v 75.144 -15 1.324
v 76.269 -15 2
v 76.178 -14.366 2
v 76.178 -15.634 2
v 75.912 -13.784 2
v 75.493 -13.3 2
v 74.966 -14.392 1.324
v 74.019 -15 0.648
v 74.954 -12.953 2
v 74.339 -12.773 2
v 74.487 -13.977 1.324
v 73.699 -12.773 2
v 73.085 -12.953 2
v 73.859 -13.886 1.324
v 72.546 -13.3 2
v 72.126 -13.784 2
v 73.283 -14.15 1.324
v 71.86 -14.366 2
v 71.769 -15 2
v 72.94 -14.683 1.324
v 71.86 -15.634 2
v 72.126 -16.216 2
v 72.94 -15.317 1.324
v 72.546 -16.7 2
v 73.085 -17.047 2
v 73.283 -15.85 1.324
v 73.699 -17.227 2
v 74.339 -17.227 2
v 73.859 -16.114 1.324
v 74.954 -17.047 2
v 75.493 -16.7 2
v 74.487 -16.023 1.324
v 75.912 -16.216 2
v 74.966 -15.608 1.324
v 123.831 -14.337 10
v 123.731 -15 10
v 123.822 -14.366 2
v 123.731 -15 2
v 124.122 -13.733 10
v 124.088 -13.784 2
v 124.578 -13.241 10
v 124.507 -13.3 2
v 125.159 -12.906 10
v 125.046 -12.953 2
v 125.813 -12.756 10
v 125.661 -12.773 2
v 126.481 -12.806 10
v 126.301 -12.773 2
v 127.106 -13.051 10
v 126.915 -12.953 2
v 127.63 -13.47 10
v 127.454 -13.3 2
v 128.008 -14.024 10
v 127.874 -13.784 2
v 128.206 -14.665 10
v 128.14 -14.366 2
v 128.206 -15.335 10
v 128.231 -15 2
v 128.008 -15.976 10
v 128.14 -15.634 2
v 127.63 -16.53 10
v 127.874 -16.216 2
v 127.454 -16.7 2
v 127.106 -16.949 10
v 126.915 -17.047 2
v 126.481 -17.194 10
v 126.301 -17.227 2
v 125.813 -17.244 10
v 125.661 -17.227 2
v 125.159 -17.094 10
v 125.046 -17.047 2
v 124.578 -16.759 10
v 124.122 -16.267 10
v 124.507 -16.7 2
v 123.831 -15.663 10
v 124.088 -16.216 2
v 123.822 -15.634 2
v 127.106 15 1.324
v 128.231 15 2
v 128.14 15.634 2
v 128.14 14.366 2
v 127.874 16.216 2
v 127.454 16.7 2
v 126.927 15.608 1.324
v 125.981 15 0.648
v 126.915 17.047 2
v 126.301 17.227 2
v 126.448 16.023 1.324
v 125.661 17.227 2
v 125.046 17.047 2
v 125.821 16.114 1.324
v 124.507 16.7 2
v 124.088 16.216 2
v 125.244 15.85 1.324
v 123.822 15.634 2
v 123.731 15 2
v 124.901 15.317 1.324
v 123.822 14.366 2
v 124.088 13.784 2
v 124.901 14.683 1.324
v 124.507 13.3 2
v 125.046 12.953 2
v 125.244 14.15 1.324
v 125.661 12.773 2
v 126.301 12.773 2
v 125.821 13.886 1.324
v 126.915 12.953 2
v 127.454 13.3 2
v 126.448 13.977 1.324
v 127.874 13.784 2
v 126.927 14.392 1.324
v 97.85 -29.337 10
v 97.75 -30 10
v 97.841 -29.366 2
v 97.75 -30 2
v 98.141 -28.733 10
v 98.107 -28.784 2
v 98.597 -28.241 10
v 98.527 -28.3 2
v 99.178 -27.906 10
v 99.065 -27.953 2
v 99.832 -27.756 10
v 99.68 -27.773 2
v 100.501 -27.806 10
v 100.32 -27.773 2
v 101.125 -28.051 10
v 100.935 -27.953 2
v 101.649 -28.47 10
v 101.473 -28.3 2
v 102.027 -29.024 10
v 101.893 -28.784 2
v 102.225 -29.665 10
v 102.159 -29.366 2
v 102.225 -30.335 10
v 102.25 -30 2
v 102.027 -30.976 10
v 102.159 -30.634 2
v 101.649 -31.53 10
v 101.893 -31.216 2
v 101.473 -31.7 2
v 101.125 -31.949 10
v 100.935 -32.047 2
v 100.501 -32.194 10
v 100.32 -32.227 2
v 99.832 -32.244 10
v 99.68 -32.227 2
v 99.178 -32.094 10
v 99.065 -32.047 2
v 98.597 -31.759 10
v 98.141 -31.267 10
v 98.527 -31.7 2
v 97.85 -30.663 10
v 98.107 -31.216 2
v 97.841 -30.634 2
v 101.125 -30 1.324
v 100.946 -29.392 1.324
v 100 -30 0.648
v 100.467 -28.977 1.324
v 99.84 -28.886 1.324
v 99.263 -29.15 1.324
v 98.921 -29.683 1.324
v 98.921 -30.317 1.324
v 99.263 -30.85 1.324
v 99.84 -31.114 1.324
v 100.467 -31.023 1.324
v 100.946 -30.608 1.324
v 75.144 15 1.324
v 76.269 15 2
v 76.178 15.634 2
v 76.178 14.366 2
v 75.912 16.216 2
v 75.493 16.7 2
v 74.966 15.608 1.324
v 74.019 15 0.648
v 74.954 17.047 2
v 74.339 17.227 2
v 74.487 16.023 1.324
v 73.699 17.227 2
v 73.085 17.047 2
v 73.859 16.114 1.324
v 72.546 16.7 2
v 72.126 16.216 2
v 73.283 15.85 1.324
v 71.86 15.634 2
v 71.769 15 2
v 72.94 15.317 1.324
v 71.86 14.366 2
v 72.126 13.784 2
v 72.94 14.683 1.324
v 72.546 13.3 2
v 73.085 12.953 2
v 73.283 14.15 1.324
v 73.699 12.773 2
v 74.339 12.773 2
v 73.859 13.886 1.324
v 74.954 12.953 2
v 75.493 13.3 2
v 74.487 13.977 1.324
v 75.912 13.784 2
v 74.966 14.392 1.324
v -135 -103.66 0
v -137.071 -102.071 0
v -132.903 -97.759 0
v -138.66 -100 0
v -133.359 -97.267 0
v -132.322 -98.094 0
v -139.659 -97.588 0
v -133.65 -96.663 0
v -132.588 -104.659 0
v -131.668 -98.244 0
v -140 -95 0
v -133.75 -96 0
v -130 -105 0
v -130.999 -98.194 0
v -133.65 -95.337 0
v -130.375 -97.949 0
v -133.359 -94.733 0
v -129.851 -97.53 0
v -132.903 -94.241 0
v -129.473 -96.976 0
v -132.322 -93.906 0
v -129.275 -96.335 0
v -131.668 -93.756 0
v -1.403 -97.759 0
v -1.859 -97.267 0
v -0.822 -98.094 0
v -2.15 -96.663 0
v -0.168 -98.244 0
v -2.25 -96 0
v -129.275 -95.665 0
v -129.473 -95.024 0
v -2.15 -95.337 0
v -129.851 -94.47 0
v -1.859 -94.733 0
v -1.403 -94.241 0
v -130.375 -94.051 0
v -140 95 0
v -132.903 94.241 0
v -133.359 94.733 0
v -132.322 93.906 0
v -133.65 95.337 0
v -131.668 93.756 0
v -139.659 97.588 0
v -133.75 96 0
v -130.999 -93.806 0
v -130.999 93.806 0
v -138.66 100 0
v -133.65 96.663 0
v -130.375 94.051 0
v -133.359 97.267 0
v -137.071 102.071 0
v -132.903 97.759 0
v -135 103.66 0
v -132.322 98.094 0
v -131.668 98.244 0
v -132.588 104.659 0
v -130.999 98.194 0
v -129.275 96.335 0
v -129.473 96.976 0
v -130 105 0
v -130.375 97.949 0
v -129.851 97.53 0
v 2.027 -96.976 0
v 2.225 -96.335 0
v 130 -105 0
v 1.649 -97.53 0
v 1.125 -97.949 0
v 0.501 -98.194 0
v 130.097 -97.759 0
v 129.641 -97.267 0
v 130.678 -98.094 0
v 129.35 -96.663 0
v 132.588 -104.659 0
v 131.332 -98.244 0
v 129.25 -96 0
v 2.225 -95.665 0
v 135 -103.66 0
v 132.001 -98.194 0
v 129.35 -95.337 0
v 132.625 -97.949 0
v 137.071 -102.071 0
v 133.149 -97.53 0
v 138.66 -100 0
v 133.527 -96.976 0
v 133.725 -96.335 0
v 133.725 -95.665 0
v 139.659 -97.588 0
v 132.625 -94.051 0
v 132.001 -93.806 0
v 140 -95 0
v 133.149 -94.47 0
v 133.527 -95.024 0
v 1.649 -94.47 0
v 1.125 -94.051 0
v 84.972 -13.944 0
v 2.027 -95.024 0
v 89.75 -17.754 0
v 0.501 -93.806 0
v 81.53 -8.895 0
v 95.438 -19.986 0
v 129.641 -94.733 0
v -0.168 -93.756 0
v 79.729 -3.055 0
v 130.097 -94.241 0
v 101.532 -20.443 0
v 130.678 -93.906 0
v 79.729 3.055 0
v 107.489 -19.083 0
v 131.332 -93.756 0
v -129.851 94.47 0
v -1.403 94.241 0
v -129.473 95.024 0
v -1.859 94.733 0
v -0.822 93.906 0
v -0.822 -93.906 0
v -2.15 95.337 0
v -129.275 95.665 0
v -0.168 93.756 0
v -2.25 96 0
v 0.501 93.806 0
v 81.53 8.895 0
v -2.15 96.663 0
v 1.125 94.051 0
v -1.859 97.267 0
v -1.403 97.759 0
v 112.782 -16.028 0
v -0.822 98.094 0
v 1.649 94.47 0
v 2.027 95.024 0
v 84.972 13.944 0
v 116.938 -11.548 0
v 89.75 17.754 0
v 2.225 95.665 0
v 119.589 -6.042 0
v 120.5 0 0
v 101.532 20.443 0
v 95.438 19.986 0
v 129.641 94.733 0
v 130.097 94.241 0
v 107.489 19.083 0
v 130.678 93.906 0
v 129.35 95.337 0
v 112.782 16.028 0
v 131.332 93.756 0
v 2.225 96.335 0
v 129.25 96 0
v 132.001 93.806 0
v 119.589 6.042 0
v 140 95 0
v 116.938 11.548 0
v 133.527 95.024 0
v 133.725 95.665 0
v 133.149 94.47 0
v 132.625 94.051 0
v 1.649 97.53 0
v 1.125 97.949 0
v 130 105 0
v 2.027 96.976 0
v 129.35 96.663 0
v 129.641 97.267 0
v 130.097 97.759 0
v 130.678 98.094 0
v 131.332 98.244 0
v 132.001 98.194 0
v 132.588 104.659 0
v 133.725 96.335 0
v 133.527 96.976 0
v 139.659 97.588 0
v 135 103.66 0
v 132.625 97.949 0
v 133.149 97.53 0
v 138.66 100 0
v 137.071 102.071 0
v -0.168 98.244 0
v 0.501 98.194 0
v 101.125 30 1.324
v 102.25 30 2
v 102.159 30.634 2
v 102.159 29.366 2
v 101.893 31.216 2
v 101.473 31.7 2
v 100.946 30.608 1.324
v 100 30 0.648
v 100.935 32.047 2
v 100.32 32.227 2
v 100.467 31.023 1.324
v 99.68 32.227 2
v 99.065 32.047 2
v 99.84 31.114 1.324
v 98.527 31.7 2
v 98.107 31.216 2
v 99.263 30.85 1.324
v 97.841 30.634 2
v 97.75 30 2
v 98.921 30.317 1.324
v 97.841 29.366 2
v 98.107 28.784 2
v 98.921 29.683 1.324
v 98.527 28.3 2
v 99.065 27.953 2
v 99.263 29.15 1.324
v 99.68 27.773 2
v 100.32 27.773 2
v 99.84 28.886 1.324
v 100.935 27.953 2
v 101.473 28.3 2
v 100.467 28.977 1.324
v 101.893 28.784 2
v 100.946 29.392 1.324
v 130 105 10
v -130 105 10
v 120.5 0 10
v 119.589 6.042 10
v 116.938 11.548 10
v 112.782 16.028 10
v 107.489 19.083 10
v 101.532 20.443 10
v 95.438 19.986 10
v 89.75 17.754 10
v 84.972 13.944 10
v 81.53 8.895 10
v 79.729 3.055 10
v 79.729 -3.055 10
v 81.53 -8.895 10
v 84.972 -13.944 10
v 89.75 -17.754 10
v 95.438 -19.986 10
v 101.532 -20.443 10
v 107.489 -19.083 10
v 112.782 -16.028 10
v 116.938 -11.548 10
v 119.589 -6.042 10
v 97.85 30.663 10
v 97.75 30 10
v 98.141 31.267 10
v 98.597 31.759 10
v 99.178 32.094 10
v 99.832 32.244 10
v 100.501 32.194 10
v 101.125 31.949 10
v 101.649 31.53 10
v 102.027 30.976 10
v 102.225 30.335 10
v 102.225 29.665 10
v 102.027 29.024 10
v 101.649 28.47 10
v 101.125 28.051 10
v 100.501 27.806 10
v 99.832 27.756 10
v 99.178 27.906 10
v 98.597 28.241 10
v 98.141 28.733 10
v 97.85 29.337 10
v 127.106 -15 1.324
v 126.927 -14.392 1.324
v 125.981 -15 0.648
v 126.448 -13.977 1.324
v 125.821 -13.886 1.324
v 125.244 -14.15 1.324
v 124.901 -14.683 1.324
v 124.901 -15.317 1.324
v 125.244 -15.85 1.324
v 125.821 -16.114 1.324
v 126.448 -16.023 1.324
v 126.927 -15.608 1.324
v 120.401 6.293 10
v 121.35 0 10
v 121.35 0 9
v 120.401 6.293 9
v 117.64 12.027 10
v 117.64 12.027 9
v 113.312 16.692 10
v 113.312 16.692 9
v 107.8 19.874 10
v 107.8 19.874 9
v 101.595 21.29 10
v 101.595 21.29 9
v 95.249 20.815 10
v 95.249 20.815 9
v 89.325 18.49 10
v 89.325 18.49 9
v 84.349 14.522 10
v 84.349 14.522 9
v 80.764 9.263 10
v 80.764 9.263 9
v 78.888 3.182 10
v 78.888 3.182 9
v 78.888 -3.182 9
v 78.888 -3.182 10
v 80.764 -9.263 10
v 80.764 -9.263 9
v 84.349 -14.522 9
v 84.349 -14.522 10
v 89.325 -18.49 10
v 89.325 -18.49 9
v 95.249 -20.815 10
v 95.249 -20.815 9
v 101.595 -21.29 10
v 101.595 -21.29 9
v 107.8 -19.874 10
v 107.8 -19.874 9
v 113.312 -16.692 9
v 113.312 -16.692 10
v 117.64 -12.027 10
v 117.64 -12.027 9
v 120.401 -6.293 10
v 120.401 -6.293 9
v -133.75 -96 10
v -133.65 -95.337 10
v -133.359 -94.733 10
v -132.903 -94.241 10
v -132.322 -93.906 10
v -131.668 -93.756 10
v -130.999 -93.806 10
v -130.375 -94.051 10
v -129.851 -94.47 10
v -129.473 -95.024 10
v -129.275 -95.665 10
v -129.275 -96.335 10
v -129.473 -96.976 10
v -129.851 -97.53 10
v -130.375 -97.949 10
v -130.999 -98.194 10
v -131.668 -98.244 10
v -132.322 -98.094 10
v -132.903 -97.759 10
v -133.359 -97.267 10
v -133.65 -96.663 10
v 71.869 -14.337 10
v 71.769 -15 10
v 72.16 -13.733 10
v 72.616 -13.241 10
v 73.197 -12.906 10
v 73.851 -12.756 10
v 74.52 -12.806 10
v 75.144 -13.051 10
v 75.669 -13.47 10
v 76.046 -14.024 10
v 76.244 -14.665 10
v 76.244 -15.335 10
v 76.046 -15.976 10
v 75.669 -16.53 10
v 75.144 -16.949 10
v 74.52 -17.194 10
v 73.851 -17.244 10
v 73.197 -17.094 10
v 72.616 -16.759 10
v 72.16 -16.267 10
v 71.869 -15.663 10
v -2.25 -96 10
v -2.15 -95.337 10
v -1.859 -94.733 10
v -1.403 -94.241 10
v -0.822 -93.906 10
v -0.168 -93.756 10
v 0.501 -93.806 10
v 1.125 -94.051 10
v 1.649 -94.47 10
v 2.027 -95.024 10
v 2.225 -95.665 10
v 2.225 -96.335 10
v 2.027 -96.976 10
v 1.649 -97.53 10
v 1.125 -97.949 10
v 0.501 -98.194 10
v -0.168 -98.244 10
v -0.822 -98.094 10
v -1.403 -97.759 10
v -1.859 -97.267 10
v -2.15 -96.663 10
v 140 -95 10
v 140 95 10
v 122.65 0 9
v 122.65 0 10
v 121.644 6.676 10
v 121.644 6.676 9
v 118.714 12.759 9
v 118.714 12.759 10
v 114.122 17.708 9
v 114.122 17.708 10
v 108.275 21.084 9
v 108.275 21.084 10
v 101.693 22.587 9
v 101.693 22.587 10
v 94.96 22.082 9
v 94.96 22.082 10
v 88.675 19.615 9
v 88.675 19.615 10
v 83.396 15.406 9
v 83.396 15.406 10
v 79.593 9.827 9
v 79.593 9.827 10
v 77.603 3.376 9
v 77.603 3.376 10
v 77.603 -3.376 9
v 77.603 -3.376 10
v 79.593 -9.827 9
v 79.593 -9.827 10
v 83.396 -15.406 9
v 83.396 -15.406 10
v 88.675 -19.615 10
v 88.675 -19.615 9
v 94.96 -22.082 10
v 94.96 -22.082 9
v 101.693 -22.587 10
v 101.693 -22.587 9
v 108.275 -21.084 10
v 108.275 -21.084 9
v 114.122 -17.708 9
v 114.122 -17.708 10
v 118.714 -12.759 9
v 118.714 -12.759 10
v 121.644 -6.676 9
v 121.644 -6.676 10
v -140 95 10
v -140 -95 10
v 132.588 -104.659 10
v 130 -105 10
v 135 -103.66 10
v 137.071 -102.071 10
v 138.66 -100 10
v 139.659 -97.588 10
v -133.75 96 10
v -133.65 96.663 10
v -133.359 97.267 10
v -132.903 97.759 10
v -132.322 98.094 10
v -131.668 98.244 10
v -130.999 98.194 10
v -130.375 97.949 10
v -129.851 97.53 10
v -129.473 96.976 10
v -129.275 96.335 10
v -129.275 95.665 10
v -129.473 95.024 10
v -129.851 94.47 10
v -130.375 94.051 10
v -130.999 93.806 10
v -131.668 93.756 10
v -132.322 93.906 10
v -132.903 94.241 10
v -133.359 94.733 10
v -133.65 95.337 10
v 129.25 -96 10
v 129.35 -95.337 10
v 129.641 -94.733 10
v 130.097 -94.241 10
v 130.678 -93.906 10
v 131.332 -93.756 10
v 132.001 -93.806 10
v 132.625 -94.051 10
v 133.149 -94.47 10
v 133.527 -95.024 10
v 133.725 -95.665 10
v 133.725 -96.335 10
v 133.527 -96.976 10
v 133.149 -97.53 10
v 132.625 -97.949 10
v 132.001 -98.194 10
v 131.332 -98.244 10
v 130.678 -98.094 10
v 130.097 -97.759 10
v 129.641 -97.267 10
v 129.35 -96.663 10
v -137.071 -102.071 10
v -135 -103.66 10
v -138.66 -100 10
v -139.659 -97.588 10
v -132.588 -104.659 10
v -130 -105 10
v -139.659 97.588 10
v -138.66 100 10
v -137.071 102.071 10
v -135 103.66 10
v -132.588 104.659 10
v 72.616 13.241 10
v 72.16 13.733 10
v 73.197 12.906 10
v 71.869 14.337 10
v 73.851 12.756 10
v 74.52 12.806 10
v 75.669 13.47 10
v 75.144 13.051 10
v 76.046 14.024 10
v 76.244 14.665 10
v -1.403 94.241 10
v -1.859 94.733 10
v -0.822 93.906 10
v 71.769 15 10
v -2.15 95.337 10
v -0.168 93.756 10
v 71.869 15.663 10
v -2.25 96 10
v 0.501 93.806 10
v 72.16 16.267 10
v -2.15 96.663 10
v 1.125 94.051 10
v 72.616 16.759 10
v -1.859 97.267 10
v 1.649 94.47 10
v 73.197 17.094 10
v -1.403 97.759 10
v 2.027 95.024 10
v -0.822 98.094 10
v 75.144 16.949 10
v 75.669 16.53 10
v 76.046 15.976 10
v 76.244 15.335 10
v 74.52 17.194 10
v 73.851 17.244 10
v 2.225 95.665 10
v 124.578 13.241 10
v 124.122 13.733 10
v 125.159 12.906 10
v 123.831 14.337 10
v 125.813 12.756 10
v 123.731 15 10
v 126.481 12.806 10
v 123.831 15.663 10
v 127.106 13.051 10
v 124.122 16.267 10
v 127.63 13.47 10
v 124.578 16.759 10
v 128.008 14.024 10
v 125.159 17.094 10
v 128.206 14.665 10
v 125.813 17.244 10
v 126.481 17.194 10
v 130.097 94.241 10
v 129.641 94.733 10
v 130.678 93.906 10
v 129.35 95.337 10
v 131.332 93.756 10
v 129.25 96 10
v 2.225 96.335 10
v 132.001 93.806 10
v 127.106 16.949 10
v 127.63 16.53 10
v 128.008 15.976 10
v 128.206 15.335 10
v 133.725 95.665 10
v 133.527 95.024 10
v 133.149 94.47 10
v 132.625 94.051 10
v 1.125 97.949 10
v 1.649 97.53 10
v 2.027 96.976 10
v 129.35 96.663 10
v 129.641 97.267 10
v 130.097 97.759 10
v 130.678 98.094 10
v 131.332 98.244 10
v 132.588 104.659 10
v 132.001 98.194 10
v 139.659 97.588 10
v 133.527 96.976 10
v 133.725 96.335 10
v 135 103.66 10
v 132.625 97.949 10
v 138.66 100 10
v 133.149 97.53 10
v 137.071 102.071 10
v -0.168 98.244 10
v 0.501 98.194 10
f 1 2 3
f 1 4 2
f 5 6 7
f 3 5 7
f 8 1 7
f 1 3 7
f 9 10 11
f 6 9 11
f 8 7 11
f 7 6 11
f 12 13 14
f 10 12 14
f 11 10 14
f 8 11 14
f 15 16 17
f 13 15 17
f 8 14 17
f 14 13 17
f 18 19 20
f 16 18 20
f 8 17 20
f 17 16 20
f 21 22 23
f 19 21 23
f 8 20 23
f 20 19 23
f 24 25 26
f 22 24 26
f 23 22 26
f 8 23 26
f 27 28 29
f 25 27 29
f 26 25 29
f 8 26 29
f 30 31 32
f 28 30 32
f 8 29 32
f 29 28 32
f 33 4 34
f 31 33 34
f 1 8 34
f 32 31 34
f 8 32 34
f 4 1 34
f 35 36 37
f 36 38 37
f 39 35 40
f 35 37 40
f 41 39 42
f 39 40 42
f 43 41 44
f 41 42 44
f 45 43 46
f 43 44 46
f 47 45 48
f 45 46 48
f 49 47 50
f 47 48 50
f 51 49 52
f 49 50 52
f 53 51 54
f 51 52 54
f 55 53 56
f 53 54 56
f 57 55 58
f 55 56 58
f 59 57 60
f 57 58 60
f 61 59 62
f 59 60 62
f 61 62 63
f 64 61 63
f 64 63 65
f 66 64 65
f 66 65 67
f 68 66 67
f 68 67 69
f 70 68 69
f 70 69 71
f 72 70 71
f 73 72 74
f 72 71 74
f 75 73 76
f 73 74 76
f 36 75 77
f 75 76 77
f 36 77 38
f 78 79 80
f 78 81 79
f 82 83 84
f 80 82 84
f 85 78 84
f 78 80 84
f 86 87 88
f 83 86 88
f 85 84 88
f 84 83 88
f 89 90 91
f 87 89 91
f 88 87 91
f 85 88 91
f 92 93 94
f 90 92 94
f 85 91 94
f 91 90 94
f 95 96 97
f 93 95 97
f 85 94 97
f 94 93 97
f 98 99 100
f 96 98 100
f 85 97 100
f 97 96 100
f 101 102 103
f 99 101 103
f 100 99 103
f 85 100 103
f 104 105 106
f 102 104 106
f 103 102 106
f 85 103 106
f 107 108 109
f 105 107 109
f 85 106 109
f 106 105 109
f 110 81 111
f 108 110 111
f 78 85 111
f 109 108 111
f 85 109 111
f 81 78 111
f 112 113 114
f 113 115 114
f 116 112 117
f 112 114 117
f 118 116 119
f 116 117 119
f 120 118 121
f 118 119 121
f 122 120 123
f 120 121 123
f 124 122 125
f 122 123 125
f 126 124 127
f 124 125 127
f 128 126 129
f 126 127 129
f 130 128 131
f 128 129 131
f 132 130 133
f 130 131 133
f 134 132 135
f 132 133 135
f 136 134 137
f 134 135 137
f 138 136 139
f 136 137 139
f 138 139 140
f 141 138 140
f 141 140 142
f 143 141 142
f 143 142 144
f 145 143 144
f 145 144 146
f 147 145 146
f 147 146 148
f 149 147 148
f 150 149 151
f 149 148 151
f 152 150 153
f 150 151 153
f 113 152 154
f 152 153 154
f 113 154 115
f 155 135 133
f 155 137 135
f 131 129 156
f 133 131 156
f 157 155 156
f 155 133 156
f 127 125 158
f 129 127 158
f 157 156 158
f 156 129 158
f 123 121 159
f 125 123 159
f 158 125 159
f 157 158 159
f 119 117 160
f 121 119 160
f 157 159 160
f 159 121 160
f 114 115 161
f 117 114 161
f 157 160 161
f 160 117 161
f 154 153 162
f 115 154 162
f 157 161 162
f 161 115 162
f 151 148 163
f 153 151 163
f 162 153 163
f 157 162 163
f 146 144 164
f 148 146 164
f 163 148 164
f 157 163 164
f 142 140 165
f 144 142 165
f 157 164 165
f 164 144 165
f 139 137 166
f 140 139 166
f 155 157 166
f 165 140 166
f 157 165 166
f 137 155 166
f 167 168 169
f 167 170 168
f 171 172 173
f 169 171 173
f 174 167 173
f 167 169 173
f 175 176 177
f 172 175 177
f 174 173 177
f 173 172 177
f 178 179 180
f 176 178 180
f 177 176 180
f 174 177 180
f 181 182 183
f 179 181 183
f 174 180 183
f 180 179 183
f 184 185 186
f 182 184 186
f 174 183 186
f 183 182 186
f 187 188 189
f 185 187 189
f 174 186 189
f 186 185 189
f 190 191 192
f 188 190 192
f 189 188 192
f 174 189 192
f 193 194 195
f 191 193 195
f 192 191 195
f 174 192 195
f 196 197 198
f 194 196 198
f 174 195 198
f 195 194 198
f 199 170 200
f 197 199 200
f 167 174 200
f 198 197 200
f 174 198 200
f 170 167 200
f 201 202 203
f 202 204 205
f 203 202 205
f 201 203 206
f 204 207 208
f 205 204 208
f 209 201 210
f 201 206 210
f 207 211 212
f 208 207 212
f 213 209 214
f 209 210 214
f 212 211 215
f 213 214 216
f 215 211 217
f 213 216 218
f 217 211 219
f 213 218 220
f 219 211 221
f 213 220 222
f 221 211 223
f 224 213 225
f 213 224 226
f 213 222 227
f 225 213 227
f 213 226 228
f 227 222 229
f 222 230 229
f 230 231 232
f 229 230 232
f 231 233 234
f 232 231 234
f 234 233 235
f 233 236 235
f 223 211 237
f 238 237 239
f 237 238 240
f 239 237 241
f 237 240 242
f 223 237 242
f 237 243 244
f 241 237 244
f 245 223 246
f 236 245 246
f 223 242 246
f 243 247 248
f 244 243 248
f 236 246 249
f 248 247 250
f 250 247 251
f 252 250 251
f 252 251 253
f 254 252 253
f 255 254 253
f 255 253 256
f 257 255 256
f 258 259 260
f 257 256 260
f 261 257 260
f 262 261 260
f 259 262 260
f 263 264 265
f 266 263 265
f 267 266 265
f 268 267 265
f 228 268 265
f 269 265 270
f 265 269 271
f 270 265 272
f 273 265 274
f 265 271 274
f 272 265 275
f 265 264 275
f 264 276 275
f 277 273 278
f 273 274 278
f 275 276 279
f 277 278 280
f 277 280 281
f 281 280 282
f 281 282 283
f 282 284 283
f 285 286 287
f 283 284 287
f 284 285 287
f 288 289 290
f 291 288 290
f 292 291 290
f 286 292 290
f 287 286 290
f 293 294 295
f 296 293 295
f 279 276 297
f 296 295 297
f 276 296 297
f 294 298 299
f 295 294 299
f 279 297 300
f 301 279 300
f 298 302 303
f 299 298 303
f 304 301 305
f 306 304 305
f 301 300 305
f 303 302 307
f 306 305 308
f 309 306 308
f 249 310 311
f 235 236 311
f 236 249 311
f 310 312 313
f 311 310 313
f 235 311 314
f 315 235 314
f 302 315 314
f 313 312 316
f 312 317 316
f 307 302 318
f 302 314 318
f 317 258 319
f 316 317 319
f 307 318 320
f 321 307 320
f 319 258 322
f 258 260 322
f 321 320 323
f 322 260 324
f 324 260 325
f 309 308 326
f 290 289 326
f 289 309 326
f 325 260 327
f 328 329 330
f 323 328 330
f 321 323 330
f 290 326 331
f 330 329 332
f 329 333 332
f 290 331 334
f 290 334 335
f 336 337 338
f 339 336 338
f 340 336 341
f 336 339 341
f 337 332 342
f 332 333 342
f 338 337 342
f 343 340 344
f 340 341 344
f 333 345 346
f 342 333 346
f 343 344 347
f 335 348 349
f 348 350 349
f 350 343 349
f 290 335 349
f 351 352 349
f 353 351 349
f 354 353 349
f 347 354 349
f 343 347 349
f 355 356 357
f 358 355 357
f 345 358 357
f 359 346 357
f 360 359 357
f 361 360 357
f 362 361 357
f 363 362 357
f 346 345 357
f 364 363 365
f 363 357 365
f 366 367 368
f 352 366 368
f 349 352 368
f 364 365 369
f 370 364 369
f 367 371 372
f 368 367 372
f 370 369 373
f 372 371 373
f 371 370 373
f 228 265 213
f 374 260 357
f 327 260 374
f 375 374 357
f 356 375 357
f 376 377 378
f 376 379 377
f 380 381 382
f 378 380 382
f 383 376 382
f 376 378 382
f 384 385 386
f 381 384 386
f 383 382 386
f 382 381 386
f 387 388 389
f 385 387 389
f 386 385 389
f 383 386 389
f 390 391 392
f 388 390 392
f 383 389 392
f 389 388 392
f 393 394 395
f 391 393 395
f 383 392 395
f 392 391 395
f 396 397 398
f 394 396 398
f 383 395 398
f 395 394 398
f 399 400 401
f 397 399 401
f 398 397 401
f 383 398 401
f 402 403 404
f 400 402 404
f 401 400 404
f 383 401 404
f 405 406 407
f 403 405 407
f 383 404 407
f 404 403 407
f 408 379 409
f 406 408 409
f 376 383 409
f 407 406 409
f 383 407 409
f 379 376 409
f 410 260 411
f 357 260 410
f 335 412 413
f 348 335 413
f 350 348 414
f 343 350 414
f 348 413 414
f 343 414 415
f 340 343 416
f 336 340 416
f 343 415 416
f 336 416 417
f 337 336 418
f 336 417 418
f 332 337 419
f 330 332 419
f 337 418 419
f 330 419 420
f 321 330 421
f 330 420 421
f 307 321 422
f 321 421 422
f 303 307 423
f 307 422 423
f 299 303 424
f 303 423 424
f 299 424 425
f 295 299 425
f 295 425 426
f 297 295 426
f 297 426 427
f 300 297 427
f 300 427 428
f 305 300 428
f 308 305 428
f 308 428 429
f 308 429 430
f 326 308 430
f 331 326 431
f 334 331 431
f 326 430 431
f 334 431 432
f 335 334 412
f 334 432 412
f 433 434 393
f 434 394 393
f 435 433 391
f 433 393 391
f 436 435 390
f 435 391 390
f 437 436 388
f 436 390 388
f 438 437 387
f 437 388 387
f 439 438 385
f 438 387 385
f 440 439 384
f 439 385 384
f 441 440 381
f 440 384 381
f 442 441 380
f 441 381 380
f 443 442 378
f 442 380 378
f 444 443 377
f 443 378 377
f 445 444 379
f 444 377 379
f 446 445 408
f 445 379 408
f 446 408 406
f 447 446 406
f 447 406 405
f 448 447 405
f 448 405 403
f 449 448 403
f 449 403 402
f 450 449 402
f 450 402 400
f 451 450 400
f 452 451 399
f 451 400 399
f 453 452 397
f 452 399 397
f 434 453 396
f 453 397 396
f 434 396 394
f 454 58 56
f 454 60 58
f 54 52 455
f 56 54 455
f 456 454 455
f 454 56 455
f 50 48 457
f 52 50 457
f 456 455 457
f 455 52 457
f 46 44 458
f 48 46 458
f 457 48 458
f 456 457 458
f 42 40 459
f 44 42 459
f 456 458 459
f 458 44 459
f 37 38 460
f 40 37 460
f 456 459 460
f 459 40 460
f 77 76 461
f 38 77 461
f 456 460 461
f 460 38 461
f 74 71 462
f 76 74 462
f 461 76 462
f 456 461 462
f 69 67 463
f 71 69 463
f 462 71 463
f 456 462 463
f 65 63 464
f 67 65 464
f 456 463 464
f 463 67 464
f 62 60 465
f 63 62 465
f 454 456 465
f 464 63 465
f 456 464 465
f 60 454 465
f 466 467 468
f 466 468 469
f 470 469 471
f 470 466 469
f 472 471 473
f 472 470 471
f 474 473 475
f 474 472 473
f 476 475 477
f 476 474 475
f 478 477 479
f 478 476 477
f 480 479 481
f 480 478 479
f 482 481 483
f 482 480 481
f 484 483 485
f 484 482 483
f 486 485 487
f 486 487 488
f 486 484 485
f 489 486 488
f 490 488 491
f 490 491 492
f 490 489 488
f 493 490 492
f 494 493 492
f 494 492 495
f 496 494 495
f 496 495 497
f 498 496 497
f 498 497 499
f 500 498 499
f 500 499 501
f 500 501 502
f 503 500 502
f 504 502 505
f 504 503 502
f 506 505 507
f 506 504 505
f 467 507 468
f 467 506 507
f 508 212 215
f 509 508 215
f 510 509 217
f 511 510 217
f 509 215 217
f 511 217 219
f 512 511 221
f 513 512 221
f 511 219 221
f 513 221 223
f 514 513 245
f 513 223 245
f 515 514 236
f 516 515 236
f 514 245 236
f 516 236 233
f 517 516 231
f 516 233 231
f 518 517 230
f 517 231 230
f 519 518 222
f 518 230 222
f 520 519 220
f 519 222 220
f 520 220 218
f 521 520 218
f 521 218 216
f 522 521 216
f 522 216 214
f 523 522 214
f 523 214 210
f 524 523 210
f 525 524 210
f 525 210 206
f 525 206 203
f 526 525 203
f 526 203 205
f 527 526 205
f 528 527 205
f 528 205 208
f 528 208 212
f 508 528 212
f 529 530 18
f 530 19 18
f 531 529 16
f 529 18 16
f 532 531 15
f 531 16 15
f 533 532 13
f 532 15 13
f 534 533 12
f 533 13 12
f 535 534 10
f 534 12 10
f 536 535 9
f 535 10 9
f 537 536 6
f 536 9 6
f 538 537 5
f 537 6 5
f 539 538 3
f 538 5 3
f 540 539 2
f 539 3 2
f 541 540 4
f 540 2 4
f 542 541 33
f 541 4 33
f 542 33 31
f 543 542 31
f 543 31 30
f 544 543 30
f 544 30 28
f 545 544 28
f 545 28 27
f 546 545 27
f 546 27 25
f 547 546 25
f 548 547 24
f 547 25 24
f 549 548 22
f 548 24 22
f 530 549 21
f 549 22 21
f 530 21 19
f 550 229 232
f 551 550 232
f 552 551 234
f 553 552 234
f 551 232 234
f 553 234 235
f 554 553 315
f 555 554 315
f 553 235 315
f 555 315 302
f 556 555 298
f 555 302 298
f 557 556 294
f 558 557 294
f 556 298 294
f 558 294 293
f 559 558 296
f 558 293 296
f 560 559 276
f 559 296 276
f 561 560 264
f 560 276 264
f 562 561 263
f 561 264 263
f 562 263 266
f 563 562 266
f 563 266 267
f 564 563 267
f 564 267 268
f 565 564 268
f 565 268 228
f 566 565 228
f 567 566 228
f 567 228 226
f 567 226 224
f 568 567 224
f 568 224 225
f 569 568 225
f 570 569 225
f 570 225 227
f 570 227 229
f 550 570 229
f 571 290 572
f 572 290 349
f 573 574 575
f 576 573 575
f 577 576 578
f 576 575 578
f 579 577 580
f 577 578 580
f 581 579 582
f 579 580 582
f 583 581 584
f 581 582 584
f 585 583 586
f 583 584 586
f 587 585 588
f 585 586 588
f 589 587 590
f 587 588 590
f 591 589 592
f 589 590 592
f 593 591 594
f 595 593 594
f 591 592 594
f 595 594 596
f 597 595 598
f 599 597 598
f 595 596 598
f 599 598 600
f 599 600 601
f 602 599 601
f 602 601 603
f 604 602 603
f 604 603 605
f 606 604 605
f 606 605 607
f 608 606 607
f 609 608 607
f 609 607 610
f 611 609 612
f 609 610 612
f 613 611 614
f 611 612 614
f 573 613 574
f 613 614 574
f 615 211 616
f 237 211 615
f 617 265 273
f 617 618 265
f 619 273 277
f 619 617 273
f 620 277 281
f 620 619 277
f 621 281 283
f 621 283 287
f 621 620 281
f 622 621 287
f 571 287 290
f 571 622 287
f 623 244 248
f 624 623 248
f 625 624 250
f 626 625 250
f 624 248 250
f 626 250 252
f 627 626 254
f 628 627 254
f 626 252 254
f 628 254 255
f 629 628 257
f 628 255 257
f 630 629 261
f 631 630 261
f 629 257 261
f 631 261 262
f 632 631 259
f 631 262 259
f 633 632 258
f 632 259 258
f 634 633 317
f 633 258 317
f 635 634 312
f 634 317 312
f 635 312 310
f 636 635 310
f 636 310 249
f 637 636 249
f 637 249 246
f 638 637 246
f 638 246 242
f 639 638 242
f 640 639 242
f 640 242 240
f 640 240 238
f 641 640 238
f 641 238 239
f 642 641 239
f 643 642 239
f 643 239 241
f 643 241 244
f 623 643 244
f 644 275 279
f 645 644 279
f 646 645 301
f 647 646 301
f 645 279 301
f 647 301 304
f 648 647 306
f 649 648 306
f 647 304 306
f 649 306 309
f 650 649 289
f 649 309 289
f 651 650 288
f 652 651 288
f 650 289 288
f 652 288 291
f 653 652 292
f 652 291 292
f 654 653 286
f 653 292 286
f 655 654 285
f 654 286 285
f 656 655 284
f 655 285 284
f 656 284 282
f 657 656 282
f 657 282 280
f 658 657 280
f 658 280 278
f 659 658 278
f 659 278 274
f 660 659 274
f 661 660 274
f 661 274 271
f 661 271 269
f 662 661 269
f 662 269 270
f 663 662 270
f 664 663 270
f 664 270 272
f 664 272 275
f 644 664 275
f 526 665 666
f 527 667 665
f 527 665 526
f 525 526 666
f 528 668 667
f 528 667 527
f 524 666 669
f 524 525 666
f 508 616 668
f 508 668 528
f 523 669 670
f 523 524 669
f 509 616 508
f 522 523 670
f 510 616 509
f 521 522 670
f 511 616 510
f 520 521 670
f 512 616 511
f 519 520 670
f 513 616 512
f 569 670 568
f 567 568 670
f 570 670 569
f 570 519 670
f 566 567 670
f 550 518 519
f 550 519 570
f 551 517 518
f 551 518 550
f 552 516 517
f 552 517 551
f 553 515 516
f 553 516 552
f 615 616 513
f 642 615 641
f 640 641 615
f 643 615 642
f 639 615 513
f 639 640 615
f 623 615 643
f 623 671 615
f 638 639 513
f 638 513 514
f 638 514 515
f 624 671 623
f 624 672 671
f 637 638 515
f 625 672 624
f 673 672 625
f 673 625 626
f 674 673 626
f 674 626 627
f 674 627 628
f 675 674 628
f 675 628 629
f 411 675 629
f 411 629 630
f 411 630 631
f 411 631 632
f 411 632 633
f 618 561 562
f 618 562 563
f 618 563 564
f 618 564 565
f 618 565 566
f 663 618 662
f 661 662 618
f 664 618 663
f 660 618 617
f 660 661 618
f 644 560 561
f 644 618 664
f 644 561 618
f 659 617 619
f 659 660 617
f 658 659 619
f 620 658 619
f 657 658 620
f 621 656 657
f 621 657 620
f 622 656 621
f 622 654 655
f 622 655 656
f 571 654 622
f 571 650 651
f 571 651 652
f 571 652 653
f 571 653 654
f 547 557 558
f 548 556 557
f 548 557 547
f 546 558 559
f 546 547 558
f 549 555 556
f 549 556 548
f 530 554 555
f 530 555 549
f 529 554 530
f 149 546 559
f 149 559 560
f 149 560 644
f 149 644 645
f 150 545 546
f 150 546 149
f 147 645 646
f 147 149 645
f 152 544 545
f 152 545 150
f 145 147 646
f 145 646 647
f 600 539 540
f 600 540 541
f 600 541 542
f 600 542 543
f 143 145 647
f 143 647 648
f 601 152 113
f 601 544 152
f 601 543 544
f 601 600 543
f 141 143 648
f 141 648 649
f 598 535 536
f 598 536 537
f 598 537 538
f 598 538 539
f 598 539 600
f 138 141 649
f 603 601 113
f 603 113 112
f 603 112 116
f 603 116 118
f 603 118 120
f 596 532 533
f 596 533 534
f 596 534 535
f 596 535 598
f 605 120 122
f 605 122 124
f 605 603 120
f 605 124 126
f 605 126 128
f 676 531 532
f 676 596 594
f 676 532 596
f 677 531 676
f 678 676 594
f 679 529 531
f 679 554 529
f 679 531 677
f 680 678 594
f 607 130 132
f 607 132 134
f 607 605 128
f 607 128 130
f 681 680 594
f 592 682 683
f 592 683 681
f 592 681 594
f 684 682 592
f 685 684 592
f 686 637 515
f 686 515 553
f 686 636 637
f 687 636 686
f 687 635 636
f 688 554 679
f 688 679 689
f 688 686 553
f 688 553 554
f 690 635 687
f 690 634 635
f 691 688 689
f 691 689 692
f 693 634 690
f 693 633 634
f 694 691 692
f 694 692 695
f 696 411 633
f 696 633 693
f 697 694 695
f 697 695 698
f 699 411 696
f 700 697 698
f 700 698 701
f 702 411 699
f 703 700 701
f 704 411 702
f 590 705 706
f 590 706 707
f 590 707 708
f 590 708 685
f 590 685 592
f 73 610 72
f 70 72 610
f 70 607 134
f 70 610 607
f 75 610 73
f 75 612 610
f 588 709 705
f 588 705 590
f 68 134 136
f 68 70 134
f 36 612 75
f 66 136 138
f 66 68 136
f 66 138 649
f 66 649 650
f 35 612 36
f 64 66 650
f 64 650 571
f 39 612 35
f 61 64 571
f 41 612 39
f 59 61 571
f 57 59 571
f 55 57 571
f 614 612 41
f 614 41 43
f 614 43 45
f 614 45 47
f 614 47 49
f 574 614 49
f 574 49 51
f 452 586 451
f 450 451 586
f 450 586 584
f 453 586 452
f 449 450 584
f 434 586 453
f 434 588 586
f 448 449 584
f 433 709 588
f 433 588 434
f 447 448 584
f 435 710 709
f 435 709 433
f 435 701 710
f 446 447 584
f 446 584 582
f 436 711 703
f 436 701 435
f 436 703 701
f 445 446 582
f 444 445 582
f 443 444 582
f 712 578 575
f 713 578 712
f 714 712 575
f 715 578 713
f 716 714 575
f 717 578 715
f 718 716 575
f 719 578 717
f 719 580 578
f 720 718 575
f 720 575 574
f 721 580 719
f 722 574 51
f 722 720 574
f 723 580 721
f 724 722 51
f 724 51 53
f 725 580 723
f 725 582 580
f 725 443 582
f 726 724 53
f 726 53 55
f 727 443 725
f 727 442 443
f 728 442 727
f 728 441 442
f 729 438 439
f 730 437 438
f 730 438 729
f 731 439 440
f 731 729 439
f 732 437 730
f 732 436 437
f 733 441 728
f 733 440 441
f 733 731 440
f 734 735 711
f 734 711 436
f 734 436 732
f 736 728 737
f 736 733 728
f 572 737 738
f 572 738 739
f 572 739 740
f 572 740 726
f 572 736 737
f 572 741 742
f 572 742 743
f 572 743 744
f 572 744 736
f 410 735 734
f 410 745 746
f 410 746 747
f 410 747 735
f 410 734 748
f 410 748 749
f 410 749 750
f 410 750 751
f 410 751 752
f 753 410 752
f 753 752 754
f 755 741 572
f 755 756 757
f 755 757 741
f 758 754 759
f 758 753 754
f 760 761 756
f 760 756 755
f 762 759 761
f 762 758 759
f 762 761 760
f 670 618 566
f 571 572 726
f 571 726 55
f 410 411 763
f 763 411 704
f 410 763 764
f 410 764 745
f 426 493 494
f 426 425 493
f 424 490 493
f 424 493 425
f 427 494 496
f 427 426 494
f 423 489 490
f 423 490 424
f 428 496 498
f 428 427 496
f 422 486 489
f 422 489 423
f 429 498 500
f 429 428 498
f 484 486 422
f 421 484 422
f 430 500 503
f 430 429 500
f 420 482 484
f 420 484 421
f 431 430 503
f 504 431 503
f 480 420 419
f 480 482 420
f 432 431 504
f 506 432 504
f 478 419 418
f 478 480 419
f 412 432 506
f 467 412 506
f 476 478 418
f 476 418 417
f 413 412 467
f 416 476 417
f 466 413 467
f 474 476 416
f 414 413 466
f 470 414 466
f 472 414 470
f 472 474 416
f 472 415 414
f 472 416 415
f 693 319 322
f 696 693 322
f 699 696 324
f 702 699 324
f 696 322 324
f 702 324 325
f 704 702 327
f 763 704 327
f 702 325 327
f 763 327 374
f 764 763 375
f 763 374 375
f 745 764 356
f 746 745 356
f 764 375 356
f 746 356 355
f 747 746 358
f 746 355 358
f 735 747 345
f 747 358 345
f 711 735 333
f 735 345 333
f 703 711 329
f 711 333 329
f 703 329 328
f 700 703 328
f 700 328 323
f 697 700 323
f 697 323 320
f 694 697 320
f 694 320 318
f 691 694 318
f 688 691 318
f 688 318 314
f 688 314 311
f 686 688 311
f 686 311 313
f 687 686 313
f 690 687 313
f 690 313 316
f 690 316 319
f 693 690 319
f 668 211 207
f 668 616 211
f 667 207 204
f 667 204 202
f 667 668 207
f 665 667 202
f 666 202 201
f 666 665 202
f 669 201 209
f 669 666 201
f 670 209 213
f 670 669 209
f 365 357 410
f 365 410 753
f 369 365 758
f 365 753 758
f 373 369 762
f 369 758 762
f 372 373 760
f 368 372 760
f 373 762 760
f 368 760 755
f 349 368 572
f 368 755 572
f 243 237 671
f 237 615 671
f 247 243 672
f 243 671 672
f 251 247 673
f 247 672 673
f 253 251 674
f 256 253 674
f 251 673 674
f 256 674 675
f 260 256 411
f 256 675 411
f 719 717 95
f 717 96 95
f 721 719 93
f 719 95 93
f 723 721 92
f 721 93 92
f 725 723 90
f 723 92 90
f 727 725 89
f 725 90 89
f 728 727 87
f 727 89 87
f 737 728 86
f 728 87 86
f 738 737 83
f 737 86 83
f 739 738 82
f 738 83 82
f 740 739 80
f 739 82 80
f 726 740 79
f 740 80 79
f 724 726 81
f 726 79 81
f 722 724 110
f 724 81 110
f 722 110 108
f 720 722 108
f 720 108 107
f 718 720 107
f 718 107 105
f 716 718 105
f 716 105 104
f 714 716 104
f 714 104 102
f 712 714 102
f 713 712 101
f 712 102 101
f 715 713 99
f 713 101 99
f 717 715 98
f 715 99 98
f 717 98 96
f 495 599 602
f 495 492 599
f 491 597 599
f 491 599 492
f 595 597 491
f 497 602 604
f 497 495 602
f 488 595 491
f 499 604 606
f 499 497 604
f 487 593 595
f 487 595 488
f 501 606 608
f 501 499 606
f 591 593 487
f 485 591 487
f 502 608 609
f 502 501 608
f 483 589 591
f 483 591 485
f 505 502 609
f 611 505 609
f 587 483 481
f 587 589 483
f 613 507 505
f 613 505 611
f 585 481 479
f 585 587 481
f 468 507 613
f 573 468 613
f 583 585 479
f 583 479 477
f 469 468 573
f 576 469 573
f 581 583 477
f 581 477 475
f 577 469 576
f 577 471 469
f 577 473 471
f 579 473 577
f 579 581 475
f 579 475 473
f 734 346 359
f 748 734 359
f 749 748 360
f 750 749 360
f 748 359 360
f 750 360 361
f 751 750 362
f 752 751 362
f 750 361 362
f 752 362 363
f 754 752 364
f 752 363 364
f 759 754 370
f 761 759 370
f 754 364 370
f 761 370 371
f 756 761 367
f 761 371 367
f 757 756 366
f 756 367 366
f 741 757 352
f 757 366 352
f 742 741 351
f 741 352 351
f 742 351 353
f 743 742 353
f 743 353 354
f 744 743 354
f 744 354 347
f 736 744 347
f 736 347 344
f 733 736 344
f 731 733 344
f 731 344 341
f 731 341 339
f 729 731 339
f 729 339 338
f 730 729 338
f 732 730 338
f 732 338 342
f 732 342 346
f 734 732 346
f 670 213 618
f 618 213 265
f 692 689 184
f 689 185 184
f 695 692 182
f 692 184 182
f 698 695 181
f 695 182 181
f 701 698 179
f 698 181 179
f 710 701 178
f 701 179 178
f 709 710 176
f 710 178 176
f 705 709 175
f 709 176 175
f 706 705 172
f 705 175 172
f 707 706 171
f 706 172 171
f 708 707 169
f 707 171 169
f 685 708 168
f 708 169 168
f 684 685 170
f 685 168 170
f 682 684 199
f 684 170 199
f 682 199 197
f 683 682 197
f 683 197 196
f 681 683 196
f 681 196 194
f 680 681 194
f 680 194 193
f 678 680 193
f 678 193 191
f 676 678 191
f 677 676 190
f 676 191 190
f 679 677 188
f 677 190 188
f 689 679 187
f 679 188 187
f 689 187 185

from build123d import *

# Parameters (mm, degrees)
F0_W     = 280
F0_H     = 210
F1_DEPTH = 10
F2_R     = 20.5
F3_DEPTH = 10
F5_R     = 10
F7_D     = 4.5
F8_D     = 4.5
F8_DEPTH = 8
F8_TIP   = 1.3519363928
F2_R_2   = 22.65
F2_R_3   = 21.35
F9_DEPTH = 1


with BuildPart() as f1:
    # F0 (on Top) → F1 (new body)
    with BuildSketch(Plane.XY):
        Rectangle(F0_W, F0_H)
    extrude(amount=F1_DEPTH)


with BuildPart() as f3:
    # F2 (on face) → F3 (new body)
    with BuildSketch(Plane.XY.offset(10)):
        with Locations((100, 0)):
            Circle(F2_R)
    extrude(amount=-F3_DEPTH)


with BuildPart() as f1_1:
    add(f1.part)

    # F4: cut F3
    add(f3.part, mode=Mode.SUBTRACT)

    # F5
    f5_edges = [f1_1.edges().sort_by_distance(p)[0] for p in [
        (-140, 105, 5),
        (140, 105, 5),
        (140, -105, 5),
        (-140, -105, 5),
    ]]
    fillet(f5_edges, radius=F5_R)

    # F7 (through all)
    with Locations(Plane.XY.offset(10)):
        with Locations((-131.5, 96), (0, 96), (131.5, 96), (131.5, -96), (0, -96), (-131.5, -96)):
            Hole(F7_D / 2)

    # F8
    with Locations(Plane.XY.offset(10)):
        with Locations((100, 30), (125.9807621135, 15), (125.9807621135, -15), (100, -30), (74.0192378865, -15), (74.0192378865, 15)):
            Hole(F8_D / 2, depth=F8_DEPTH)
            with Locations((0, 0, -(F8_DEPTH + F8_TIP / 2))):  # 118° drill point
                Cone(0, F8_D / 2, F8_TIP, mode=Mode.SUBTRACT)


with BuildPart() as f9:
    # F2 (on face) → F9 (new body)
    with BuildSketch(Plane.XY.offset(10)):
        with Locations((100, 0)):
            Circle(F2_R_2)
        with Locations((100, 0)):
            Circle(F2_R_3, mode=Mode.SUBTRACT)
    extrude(amount=-F9_DEPTH)


with BuildPart() as f1_2:
    add(f1_1.part)

    # F10: cut F9
    add(f9.part, mode=Mode.SUBTRACT)


solid = f1_2.part
